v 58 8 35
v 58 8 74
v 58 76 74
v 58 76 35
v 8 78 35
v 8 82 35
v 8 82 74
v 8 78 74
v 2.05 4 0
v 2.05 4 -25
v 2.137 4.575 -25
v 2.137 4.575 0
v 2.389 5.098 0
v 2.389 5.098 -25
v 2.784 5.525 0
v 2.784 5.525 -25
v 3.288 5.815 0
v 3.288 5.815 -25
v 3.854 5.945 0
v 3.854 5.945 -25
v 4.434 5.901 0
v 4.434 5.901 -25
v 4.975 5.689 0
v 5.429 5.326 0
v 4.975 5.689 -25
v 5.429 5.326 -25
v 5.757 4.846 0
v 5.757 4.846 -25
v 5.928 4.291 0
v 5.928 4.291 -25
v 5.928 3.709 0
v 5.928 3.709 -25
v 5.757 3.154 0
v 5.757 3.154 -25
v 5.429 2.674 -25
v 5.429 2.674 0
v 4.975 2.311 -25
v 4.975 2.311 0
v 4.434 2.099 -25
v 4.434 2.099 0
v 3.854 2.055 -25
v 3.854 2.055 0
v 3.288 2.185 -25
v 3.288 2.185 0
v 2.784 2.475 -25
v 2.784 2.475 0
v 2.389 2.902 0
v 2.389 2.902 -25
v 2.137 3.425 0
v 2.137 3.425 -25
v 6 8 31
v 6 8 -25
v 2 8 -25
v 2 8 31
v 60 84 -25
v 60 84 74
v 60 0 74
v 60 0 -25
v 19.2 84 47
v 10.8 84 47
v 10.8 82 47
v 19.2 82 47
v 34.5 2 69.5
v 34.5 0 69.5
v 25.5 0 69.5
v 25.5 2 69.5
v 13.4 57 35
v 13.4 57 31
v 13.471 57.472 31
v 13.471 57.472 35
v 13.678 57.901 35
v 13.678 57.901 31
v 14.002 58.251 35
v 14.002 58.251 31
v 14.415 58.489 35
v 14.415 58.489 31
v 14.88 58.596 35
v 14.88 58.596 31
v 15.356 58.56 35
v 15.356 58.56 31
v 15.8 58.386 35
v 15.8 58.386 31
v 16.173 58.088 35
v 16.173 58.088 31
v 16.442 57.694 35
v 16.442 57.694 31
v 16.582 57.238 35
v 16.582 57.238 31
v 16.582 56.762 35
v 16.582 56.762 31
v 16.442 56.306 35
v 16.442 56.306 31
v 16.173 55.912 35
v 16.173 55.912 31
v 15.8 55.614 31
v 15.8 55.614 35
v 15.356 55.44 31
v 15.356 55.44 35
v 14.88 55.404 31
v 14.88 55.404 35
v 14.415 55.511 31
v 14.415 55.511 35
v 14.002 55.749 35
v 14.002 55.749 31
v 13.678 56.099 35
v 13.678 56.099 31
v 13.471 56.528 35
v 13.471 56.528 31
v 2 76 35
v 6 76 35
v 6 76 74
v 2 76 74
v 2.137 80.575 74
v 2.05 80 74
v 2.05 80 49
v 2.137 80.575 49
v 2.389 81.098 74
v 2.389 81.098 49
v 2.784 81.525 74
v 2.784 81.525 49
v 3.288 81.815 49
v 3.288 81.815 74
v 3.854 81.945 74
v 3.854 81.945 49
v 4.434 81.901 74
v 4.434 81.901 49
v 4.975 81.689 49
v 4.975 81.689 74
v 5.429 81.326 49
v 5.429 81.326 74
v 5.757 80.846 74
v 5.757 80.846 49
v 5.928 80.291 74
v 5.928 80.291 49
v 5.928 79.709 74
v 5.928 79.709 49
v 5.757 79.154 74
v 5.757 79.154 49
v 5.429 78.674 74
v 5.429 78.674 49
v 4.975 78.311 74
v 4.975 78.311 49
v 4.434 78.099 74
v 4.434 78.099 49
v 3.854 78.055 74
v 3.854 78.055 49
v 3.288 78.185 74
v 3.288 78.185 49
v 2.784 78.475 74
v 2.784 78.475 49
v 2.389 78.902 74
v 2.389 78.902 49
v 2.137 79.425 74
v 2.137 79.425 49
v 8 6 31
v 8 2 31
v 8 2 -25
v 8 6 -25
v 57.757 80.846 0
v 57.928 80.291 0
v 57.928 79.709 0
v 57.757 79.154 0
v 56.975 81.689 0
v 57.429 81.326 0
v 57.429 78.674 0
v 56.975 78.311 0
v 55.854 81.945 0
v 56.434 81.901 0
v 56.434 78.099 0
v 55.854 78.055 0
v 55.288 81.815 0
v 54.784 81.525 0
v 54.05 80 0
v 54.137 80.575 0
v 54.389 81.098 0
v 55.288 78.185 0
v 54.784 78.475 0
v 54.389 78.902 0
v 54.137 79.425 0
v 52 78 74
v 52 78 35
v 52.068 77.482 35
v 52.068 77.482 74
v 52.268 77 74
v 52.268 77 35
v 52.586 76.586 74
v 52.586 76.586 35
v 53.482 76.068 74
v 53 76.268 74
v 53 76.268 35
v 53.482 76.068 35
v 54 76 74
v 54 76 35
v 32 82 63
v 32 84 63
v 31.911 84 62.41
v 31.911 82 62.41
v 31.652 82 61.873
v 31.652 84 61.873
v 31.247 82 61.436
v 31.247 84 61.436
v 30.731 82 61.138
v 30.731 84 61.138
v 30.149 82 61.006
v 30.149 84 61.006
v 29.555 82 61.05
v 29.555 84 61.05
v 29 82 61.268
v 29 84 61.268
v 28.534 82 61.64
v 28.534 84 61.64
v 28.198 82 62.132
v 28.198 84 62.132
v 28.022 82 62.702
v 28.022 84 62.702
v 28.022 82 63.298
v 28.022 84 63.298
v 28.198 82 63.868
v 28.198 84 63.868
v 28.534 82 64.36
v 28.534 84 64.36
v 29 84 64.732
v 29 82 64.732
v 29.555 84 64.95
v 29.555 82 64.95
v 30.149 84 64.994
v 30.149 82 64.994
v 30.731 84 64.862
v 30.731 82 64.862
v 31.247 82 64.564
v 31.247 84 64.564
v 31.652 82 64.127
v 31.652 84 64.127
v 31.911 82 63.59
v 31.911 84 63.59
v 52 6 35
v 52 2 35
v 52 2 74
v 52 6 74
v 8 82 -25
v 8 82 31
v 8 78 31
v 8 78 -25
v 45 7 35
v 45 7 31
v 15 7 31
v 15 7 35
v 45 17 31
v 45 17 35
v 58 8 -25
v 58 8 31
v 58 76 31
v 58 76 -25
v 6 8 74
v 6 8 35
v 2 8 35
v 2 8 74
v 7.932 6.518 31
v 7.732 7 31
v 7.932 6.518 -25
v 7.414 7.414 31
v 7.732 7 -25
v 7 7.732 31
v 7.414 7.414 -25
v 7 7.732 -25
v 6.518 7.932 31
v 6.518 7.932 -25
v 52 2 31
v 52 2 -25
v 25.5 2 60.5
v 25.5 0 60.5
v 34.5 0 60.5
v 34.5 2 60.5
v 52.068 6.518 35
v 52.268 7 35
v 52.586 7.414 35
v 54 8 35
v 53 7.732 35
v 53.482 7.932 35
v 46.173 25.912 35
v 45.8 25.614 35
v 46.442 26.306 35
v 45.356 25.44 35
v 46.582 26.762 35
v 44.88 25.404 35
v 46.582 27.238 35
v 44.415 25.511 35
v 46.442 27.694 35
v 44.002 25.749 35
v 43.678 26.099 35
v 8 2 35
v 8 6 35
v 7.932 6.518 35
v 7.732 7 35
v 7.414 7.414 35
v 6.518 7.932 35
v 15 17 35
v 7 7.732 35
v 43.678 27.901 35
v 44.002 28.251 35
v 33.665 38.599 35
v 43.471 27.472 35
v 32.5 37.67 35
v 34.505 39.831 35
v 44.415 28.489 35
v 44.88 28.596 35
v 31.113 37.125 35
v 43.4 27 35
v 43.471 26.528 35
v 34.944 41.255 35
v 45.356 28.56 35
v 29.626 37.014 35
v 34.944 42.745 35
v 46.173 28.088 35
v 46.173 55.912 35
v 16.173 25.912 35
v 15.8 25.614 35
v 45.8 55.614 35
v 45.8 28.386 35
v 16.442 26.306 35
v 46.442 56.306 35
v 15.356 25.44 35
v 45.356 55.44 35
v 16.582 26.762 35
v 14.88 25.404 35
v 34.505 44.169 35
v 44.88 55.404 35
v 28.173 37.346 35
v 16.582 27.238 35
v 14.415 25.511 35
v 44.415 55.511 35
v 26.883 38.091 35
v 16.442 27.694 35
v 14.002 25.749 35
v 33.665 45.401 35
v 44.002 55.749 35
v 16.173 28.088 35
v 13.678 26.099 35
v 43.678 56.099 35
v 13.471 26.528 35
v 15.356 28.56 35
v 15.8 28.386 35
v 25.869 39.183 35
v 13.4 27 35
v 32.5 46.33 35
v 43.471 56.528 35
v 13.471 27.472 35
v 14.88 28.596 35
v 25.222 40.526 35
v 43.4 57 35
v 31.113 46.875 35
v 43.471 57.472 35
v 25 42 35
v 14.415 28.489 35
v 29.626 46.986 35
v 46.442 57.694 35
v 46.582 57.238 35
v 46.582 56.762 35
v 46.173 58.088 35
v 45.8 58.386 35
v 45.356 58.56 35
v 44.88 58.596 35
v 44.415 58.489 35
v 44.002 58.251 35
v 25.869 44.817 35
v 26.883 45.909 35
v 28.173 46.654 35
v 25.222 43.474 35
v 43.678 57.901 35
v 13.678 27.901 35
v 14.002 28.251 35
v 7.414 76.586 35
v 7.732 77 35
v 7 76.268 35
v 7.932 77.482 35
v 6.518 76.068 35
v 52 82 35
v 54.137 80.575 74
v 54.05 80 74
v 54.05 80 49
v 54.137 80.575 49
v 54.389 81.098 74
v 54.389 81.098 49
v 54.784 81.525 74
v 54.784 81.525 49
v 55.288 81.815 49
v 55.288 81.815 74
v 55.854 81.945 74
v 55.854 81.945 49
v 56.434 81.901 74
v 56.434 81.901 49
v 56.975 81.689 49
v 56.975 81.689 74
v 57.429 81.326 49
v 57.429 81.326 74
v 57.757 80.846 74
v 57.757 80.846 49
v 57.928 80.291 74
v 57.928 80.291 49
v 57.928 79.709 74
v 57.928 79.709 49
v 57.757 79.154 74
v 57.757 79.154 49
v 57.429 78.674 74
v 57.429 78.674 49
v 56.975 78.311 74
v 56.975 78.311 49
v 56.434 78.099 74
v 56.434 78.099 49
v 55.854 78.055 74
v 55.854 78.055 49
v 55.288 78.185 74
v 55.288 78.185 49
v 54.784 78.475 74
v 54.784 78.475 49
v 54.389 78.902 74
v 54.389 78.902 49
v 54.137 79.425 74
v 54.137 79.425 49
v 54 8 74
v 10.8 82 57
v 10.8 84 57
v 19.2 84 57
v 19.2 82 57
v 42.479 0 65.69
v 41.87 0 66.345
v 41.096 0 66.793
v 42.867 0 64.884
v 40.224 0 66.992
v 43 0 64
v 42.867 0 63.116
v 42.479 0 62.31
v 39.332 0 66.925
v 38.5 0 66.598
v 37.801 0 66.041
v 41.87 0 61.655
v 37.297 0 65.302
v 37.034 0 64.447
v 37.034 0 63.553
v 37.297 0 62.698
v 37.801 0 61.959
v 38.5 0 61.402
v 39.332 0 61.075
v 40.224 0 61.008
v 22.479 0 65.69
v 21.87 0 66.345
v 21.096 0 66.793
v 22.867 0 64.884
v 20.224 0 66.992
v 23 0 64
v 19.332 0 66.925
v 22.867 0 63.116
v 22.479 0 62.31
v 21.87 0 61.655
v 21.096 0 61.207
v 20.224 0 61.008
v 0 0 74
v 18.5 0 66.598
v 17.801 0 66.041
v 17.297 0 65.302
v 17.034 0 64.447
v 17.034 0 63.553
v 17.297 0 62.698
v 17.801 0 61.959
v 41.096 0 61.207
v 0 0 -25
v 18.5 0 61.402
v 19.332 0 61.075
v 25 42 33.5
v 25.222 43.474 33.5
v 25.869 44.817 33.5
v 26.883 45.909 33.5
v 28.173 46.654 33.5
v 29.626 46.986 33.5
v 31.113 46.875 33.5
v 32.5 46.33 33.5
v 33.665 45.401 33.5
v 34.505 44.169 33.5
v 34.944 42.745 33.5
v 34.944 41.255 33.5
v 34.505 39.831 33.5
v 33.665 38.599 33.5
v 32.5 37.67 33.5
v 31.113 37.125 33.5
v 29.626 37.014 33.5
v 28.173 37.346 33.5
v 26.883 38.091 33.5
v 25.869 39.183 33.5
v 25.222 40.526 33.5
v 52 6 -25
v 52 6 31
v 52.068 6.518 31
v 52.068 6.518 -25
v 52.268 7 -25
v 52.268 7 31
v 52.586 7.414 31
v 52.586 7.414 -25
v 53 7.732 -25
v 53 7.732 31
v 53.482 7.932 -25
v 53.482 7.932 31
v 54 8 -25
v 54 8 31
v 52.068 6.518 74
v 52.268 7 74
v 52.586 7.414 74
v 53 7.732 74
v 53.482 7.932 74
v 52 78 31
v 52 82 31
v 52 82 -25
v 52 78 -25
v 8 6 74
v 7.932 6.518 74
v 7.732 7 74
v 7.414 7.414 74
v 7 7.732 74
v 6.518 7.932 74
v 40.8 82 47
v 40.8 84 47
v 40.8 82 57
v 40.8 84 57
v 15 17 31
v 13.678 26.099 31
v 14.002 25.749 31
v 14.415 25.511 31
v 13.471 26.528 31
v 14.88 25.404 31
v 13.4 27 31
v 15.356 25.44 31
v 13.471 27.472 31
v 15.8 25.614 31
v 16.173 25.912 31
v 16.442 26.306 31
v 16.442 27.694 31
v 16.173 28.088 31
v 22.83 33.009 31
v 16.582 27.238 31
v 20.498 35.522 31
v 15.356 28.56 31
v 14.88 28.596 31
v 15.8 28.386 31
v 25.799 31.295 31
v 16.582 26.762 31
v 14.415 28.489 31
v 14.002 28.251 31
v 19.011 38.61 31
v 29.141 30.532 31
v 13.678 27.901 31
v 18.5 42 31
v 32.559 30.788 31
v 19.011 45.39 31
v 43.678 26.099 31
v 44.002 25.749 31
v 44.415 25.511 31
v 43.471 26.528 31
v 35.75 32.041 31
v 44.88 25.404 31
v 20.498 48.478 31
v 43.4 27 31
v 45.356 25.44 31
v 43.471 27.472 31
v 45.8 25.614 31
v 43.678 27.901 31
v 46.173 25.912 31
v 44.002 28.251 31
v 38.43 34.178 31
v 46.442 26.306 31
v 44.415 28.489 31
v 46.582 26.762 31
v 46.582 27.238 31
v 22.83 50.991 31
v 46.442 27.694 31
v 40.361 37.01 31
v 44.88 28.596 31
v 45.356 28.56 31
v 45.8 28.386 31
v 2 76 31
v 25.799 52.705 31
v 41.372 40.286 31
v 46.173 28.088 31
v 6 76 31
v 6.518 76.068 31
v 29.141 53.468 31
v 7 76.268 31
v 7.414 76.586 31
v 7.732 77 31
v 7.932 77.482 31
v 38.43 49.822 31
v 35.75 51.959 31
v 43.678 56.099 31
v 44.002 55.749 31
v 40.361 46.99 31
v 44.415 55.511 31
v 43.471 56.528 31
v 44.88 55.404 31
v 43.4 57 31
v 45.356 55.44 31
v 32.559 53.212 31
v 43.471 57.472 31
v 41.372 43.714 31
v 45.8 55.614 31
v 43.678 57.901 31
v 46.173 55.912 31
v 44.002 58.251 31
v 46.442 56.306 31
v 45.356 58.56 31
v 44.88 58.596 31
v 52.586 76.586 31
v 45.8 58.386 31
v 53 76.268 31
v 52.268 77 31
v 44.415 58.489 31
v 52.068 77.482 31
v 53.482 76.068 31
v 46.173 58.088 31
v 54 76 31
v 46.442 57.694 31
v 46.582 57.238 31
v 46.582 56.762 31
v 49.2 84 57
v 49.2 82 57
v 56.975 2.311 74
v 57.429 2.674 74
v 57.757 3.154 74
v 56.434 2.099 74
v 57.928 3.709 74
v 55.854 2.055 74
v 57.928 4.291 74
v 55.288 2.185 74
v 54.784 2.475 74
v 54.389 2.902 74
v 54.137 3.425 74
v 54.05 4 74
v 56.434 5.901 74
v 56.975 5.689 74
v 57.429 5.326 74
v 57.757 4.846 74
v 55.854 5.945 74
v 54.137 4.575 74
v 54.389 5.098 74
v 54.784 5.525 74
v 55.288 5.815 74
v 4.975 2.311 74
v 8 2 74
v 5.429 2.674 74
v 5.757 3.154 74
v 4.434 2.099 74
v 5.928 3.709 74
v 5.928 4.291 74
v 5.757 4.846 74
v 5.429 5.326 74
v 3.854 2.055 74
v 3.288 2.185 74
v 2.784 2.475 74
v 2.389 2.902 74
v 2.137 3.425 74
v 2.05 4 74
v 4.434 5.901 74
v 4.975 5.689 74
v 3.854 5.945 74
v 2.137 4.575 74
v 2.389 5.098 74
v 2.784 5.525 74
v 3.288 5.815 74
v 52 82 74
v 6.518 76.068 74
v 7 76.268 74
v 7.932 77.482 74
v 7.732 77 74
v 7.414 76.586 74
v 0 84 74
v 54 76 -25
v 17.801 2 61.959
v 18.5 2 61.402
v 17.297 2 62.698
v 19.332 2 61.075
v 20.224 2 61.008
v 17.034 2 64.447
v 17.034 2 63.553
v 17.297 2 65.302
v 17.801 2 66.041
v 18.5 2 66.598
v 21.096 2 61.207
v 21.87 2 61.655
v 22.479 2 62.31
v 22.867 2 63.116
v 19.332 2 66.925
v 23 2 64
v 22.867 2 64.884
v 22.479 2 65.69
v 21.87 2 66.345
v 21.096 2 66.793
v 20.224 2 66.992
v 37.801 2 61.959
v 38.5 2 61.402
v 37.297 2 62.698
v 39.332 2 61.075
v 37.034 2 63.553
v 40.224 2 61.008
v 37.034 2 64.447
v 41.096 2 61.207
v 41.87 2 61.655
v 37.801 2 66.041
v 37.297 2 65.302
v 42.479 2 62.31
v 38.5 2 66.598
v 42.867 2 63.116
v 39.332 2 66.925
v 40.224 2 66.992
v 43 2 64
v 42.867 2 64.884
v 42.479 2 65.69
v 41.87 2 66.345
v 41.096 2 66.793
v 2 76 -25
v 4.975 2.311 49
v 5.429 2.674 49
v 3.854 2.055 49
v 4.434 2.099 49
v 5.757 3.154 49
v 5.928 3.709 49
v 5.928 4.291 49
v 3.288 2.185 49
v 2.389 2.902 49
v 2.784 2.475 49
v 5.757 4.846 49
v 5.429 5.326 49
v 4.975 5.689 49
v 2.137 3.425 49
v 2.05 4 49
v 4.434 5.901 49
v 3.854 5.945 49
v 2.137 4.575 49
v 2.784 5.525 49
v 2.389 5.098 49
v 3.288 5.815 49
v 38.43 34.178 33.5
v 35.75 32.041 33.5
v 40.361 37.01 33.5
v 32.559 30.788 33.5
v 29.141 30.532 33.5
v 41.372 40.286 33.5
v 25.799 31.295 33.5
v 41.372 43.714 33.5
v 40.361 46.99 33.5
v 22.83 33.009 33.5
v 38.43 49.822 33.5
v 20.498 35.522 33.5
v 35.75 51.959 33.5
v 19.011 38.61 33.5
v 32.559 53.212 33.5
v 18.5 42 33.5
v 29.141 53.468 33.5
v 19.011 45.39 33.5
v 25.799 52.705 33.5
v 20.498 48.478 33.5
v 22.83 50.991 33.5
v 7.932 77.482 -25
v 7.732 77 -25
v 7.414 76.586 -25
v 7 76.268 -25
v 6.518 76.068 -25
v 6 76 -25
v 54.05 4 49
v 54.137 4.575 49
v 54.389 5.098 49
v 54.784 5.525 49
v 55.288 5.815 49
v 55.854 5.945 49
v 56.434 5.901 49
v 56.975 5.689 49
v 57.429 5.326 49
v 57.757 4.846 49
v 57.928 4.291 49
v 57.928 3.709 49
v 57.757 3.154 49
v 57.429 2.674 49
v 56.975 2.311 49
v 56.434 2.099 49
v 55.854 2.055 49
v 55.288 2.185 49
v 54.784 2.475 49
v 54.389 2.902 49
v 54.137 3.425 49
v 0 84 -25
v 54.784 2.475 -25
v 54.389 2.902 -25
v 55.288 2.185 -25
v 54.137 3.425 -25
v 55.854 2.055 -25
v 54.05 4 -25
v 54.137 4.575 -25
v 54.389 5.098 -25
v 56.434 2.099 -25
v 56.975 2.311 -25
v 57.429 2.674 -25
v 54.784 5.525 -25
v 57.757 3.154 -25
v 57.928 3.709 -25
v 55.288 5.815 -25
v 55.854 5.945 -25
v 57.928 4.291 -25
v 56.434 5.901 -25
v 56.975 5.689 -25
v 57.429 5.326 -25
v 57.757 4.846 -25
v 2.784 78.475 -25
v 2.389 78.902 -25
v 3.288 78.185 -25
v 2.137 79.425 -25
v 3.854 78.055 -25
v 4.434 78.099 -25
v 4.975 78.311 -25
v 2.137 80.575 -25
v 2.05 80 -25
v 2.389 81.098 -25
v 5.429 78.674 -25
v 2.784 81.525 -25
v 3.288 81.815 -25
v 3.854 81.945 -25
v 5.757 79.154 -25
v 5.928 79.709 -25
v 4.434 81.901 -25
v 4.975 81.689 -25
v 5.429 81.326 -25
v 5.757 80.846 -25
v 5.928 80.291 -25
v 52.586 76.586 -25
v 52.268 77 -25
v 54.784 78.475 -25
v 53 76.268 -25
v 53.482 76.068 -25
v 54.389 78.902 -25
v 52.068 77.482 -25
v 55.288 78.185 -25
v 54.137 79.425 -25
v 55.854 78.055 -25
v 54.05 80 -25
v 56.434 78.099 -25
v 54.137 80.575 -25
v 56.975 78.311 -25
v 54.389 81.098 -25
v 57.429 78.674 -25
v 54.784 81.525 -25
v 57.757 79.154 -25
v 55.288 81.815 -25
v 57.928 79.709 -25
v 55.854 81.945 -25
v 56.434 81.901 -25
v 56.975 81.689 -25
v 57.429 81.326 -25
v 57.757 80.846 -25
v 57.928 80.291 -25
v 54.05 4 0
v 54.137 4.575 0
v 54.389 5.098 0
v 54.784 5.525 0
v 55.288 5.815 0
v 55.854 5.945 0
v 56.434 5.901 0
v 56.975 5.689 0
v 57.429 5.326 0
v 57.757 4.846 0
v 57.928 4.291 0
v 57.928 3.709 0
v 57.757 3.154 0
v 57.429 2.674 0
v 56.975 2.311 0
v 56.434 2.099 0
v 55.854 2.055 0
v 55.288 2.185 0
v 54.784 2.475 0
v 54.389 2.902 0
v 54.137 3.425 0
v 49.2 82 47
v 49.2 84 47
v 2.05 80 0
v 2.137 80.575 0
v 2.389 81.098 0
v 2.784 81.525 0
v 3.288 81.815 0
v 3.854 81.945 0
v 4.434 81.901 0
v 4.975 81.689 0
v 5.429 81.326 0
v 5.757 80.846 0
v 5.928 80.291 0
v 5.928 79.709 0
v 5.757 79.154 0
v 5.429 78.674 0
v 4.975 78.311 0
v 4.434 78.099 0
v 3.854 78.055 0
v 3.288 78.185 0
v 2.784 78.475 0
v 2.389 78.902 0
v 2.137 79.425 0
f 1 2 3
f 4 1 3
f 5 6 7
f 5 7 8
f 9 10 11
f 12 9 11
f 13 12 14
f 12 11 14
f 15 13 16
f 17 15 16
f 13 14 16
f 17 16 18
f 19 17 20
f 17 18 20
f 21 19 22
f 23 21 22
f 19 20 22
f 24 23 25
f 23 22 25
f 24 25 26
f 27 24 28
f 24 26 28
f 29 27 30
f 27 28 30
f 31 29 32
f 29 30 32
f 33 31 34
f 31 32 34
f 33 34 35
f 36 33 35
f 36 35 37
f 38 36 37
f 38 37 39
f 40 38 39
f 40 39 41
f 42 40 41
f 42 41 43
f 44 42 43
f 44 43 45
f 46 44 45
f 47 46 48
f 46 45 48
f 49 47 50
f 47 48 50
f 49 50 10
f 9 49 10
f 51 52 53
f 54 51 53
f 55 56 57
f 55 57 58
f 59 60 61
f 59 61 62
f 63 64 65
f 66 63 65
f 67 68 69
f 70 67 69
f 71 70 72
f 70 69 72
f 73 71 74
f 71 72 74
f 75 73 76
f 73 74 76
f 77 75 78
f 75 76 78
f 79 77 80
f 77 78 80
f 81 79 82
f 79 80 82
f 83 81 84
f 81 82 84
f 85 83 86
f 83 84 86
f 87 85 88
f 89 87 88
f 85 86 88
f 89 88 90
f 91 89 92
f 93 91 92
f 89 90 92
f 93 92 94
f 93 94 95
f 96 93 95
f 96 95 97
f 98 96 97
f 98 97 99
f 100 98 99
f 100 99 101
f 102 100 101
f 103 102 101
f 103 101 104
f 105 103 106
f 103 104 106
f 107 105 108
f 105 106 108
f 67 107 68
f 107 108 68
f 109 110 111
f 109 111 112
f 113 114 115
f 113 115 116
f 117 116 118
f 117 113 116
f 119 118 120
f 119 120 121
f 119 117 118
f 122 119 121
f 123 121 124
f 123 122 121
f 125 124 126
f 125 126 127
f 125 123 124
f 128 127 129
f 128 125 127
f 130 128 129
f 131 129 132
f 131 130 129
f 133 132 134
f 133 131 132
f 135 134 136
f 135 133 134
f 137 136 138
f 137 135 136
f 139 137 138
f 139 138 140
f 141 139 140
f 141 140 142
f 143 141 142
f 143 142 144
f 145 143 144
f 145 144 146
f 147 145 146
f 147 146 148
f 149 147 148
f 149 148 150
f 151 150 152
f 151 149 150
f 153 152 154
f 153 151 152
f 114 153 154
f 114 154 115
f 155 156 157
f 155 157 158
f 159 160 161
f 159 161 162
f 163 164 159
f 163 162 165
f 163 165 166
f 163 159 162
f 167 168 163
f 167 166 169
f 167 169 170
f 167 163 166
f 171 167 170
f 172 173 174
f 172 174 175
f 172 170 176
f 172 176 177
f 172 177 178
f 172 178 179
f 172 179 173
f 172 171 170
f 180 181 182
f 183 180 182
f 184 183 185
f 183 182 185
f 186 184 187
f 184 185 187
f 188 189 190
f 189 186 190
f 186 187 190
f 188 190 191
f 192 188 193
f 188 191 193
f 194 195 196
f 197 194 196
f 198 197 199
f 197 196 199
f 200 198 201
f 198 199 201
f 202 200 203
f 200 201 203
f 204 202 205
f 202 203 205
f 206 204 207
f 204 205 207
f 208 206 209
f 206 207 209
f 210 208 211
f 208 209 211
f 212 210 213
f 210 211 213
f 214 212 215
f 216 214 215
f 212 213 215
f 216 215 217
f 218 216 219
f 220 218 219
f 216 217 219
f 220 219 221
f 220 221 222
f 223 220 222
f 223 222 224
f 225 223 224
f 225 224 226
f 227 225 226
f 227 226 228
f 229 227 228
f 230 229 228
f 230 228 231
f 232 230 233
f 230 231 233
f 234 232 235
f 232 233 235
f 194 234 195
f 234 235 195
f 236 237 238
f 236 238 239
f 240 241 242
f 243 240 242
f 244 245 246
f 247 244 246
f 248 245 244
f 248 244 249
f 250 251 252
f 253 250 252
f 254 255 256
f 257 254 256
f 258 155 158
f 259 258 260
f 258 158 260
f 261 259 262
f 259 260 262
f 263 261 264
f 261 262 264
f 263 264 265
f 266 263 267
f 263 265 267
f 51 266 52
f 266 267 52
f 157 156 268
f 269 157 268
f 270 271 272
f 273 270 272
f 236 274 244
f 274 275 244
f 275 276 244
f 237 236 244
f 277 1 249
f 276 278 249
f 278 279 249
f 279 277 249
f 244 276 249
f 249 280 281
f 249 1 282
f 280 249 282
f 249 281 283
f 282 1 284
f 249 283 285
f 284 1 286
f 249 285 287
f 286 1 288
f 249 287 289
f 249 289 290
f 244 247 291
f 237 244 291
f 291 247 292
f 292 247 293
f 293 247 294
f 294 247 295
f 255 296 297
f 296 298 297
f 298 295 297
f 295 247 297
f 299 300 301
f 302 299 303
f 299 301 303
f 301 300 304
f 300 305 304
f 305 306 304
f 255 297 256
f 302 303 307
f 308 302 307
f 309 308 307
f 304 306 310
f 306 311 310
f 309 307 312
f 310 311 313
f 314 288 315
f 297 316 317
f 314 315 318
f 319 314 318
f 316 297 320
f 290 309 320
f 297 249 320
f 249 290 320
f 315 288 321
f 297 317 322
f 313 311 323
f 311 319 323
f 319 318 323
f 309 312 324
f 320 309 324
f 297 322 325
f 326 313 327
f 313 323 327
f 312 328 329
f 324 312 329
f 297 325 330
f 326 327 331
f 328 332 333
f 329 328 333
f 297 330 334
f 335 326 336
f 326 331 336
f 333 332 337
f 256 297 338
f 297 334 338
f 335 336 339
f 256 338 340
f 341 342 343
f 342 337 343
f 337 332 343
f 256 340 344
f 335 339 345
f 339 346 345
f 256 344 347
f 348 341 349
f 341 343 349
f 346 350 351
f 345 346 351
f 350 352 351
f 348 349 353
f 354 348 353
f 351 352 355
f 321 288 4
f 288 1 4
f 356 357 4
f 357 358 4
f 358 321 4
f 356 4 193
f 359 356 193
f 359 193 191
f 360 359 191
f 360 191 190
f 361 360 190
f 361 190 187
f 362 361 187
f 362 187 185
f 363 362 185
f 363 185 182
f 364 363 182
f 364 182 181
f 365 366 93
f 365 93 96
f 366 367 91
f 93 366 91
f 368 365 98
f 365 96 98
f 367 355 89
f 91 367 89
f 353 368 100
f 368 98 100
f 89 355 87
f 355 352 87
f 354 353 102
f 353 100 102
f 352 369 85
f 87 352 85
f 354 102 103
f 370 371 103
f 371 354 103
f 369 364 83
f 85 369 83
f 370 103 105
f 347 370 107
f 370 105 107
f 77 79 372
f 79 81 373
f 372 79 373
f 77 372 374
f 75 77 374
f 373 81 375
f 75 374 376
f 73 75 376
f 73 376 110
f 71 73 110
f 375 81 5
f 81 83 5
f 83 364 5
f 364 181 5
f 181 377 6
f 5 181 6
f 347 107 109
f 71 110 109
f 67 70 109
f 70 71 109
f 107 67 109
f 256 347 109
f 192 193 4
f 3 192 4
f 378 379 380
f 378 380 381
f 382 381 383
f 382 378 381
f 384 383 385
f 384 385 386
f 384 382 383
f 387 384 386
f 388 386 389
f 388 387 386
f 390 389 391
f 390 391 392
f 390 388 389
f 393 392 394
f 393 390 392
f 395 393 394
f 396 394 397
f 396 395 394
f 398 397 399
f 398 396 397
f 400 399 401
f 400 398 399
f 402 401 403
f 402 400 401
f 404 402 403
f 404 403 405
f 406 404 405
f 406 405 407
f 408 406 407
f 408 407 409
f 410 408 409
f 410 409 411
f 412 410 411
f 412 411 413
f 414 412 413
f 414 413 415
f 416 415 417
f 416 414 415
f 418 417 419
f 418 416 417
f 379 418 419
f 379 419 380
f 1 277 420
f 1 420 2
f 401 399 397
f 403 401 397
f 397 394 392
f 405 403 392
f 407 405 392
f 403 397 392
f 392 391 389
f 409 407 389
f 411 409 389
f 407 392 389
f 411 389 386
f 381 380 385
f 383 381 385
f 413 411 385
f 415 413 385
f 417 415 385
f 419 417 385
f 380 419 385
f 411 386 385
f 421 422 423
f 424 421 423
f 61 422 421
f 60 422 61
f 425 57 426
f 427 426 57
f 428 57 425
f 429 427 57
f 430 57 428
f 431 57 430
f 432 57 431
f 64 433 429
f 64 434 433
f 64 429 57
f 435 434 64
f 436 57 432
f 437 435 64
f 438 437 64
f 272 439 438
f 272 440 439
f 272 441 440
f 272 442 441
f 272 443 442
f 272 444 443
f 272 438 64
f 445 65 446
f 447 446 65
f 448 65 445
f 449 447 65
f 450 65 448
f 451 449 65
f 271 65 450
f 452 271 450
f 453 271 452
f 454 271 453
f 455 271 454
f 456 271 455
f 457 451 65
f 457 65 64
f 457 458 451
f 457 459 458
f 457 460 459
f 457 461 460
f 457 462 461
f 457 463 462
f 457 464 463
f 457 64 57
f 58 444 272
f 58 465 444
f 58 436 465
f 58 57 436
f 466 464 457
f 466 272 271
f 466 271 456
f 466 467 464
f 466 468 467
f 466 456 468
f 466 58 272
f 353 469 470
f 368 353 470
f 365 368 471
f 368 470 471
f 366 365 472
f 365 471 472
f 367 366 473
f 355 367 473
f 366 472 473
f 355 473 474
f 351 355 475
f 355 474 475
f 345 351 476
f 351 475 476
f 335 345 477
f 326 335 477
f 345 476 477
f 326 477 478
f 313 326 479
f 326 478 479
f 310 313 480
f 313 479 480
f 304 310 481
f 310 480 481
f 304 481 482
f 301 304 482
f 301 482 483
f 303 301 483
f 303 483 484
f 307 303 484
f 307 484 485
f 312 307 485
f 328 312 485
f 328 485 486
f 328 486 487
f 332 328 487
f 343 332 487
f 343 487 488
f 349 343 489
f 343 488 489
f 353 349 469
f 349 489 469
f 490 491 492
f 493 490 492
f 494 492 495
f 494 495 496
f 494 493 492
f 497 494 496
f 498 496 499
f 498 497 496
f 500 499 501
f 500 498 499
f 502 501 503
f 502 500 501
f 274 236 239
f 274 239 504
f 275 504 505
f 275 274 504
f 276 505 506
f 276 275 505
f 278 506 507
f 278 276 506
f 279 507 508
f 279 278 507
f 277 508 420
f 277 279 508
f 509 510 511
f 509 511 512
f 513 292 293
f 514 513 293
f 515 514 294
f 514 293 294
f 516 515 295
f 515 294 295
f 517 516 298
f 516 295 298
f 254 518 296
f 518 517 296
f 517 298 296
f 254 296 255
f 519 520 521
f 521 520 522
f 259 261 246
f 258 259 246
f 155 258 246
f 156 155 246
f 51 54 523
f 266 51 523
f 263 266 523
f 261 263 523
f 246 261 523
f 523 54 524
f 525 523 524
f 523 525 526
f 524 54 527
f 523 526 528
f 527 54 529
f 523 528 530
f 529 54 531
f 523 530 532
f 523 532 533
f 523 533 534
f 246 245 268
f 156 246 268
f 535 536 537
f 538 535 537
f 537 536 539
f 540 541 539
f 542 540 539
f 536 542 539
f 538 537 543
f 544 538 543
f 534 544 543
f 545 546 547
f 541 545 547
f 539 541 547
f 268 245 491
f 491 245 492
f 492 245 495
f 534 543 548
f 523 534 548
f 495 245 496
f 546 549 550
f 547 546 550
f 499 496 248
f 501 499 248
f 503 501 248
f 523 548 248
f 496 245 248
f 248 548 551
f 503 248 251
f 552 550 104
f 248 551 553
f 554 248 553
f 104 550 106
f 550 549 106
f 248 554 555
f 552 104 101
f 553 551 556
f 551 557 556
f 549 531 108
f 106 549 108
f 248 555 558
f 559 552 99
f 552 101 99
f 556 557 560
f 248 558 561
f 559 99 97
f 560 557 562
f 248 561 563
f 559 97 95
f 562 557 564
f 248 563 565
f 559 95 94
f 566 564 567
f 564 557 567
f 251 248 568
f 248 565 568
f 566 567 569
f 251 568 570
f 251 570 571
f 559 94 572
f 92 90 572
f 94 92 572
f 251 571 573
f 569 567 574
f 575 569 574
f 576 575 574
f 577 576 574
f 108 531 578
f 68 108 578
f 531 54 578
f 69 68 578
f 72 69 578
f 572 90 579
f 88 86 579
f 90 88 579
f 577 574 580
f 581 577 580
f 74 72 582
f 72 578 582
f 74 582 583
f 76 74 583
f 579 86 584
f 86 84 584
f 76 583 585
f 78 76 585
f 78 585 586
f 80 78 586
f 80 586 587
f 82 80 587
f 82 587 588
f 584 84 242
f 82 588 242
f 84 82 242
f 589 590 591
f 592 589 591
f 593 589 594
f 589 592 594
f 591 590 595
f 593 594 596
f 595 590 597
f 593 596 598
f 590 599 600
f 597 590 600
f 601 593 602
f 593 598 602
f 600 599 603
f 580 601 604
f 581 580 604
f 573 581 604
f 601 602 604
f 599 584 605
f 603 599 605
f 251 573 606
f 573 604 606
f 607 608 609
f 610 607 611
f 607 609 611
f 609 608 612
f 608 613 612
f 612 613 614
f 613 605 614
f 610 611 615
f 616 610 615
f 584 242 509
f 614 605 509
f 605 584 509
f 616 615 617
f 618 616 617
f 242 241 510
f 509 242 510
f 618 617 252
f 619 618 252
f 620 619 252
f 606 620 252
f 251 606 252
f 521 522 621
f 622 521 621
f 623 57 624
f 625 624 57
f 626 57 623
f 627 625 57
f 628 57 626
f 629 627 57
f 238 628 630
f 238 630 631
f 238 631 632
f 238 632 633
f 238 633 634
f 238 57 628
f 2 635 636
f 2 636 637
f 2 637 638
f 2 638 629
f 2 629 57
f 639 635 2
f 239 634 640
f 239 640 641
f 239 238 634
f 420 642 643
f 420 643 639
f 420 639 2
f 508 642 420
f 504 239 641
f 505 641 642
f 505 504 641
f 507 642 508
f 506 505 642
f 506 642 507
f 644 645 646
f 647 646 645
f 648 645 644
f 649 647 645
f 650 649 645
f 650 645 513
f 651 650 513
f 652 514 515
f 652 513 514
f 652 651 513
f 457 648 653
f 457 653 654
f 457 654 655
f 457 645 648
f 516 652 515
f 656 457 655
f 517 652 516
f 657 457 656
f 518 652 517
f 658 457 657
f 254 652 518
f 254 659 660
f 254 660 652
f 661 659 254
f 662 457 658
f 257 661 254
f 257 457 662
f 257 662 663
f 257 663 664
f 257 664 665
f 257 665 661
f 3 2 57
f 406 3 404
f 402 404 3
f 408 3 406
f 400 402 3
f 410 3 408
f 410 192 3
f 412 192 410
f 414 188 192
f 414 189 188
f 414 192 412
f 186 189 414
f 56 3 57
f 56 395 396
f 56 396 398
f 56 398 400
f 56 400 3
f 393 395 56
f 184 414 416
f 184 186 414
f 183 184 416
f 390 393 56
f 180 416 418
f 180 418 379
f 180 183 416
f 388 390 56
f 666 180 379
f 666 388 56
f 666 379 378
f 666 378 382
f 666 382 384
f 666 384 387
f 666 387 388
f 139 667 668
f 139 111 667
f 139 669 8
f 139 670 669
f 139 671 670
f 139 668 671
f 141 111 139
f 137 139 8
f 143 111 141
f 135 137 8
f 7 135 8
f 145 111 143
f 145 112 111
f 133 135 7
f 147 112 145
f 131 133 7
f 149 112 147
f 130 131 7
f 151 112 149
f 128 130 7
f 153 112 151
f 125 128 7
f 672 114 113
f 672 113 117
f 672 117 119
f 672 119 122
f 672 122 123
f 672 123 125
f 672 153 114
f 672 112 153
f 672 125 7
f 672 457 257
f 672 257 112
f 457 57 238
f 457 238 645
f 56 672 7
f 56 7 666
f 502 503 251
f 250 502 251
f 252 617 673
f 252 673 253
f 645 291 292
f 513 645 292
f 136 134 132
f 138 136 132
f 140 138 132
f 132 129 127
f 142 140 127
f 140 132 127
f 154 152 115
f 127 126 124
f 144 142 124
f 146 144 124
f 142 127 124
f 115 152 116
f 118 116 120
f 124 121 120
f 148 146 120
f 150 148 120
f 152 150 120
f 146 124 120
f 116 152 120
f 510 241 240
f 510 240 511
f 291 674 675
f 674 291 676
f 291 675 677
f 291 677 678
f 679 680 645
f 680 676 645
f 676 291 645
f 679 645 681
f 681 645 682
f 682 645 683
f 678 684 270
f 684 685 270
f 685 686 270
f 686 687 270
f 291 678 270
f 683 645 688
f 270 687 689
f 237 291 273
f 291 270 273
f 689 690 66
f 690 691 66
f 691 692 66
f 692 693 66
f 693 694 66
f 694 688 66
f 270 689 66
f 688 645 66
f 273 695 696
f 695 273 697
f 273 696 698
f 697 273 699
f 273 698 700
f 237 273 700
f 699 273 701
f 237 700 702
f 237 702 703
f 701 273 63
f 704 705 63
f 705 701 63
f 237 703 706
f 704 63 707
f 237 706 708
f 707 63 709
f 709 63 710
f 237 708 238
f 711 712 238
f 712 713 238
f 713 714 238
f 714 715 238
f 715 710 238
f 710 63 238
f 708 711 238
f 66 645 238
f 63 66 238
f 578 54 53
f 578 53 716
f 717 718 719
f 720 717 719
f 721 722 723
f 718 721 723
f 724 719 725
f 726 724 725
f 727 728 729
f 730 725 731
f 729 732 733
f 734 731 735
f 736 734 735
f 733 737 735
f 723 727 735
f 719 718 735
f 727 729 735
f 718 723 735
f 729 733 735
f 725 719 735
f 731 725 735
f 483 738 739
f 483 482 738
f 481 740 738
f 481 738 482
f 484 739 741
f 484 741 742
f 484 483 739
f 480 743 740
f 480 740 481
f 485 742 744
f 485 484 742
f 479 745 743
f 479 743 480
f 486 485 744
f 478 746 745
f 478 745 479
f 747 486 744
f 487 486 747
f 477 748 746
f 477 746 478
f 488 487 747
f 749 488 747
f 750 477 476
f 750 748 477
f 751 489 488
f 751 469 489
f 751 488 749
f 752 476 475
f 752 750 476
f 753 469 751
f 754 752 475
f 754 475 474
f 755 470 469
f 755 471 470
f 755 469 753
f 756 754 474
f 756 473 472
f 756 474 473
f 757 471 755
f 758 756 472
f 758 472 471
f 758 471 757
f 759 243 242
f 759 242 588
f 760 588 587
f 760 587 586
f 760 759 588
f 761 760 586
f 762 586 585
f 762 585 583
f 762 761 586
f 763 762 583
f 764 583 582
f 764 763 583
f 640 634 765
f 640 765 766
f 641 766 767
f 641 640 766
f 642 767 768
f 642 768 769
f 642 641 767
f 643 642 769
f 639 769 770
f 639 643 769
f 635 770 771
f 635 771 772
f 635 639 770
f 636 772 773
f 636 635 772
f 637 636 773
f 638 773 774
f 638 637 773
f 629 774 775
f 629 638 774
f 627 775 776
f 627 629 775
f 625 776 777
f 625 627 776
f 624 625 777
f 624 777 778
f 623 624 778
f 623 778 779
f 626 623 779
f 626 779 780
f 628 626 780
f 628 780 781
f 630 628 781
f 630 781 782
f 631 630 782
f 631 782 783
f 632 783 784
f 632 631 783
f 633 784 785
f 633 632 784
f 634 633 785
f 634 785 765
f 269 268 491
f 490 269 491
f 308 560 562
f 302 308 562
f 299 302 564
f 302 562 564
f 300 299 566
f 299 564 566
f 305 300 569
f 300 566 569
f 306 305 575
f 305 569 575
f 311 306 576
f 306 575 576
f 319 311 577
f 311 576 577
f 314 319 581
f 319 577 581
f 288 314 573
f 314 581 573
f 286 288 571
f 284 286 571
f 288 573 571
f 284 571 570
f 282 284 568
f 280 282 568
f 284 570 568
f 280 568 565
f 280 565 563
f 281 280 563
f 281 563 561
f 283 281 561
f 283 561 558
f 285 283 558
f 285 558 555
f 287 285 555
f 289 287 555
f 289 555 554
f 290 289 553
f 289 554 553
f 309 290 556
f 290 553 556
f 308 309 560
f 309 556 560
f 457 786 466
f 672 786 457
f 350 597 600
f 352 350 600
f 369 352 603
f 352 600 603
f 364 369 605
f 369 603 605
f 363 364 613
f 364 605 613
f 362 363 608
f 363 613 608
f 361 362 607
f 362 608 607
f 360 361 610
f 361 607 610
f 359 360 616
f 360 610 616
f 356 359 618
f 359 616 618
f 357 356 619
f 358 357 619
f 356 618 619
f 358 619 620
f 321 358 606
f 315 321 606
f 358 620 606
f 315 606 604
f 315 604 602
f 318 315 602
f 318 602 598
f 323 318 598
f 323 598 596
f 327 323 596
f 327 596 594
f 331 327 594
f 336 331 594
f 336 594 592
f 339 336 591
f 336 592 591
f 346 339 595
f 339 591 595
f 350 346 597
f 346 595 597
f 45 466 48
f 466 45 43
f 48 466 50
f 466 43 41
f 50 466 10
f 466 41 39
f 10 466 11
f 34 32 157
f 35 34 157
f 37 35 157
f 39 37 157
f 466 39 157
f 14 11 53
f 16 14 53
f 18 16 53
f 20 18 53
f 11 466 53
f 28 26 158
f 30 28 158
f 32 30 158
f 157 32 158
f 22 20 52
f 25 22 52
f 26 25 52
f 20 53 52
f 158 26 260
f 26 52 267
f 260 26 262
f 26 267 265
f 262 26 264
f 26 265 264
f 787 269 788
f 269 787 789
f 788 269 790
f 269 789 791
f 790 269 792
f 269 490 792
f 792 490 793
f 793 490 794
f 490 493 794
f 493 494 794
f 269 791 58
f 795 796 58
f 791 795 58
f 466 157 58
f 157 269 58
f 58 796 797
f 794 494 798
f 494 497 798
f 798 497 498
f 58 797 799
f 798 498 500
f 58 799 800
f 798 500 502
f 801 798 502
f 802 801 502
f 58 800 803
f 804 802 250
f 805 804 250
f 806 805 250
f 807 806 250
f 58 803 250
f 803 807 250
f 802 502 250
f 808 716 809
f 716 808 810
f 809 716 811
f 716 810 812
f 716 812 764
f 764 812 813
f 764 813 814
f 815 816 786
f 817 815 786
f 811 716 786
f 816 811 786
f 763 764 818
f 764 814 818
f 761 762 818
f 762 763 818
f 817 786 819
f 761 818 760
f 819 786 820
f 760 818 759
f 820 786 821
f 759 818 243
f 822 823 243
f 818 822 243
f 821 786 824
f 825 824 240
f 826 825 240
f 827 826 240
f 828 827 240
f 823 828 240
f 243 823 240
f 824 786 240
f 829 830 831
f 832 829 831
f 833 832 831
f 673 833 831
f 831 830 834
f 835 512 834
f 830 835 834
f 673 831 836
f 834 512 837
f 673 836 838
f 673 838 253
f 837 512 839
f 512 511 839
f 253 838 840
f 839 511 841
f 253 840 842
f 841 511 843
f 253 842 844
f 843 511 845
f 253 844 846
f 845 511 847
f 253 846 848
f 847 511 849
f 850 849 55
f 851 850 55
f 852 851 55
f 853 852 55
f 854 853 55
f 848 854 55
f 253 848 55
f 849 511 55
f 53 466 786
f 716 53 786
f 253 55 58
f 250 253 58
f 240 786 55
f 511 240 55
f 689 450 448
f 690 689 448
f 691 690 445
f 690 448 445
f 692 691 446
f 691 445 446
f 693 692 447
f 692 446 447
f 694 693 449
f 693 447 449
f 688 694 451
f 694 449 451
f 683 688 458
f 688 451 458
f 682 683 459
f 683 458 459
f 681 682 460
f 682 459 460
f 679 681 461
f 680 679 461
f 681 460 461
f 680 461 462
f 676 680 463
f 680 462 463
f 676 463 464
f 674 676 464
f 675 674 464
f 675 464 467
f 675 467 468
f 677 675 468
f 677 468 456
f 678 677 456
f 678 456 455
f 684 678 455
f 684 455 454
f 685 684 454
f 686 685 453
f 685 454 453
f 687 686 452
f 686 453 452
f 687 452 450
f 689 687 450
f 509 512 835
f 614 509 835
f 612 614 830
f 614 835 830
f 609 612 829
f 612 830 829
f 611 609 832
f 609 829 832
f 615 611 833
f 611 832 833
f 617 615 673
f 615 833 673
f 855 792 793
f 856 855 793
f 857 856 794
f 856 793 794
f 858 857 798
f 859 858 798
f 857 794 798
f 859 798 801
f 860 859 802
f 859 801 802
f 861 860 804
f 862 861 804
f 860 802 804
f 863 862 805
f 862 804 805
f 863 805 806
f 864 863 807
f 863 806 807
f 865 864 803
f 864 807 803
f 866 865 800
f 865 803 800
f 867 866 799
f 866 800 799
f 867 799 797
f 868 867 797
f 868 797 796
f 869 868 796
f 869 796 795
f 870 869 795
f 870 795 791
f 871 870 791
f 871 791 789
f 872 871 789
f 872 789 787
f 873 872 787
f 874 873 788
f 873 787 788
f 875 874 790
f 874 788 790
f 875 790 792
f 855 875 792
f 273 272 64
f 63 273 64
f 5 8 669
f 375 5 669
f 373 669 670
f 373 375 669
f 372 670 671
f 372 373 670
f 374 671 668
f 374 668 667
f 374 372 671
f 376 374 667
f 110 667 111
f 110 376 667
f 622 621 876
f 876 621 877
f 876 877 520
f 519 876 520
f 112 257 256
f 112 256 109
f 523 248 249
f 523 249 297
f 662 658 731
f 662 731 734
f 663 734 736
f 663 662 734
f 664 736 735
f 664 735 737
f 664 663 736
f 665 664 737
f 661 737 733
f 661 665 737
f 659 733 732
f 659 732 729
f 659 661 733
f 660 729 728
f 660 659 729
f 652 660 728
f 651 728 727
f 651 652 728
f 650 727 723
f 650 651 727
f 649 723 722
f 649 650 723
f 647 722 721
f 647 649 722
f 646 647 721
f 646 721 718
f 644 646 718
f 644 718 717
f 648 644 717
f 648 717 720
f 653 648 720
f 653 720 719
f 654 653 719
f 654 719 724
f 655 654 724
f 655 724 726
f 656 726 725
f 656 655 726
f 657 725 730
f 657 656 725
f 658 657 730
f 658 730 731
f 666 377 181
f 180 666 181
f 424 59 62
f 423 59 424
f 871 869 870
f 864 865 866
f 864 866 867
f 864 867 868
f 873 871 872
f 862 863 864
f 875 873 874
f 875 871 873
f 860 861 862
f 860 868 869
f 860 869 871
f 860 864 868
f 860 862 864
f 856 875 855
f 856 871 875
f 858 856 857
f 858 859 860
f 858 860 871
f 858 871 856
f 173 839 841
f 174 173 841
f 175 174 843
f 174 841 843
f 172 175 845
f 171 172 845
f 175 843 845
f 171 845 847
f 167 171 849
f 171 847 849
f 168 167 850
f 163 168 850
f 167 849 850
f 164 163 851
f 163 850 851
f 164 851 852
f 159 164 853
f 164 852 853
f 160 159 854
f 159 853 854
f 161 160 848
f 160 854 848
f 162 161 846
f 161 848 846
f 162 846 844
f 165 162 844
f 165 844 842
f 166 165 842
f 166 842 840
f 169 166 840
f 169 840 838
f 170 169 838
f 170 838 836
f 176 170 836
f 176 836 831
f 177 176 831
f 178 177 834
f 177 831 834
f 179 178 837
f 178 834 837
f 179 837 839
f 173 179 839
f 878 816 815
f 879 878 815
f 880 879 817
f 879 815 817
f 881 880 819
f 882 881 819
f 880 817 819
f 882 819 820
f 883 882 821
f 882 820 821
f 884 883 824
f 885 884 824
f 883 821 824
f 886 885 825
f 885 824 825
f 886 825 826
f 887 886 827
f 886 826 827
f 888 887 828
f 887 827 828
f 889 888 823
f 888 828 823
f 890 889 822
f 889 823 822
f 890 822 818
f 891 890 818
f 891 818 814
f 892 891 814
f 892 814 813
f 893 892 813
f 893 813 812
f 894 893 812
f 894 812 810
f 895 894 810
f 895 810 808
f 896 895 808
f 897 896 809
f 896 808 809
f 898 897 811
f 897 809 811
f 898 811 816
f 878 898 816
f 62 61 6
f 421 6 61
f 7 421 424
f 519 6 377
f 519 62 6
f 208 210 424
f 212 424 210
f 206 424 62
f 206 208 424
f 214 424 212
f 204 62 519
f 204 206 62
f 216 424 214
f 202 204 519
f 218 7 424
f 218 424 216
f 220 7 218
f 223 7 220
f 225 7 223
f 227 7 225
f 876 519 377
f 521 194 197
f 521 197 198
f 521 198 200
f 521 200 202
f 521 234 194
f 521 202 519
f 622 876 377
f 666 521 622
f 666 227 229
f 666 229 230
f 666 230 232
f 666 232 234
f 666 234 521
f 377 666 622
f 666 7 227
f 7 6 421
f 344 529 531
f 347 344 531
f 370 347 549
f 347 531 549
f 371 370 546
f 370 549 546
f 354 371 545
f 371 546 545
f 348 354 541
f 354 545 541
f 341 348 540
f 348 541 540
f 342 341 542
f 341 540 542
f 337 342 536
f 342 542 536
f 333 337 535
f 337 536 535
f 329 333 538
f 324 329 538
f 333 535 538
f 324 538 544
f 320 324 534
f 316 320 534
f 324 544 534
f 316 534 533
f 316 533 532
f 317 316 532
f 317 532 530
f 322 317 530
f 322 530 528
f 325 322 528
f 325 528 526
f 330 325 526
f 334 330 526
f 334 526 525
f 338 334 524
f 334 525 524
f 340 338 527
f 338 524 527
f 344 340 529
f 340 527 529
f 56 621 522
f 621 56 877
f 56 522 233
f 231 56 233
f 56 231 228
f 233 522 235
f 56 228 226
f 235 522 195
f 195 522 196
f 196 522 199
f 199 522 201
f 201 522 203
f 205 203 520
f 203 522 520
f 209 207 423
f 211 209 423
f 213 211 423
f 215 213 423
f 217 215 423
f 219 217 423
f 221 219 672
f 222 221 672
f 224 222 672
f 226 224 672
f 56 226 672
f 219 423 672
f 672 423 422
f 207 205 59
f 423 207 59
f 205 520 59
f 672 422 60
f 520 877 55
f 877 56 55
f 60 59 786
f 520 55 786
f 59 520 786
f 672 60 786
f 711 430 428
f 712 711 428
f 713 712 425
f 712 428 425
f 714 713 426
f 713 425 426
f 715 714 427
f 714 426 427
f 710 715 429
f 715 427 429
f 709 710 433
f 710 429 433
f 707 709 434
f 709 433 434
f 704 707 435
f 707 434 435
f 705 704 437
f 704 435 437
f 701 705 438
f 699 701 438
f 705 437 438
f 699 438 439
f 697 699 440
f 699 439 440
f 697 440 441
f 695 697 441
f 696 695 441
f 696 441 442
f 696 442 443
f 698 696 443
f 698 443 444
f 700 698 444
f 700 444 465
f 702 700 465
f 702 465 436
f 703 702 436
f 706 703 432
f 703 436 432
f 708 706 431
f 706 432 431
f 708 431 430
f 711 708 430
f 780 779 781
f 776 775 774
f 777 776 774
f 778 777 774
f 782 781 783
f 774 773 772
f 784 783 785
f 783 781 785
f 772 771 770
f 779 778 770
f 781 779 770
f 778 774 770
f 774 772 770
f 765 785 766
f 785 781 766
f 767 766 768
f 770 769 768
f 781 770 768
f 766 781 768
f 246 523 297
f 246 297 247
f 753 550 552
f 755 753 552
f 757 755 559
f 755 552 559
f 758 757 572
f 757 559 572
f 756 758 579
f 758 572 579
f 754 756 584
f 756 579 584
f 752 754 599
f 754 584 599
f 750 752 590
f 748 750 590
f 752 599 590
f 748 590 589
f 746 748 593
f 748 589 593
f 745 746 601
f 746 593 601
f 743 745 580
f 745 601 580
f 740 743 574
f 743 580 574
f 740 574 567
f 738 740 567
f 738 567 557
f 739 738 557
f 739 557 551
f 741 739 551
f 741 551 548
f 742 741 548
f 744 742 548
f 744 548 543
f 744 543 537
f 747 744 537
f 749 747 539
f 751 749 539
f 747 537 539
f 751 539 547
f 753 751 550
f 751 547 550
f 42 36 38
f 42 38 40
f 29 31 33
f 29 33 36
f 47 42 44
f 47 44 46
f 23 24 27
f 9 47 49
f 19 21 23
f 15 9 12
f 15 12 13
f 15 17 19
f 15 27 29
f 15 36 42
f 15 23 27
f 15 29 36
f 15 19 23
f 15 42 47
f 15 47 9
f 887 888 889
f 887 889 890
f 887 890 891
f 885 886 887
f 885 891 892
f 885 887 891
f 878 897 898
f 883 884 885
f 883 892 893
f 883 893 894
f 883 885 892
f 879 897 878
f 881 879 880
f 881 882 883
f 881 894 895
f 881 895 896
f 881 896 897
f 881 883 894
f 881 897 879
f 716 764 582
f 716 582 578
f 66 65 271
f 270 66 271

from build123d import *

# Parameters (mm, degrees)
SKETCH1_W                = 60
SKETCH1_H                = 84
BOSS_EXTRUDE2_DEPTH      = 82
BOSS_EXTRUDE2_DEPTH_BACK = 25
SKETCH2_W                = 56
SKETCH2_H                = 80
CUT_EXTRUDE1_DEPTH       = 108
BOSS_EXTRUDE6_DEPTH      = 107
SKETCH22_R               = 1.95
CUT_EXTRUDE6_DEPTH       = 25
CUT_EXTRUDE9_DEPTH       = 2
SKETCH28_W               = 8
SKETCH28_H               = 85.946450773
CUT_EXTRUDE11_DEPTH      = 60
BOSS_EXTRUDE9_DEPTH      = 84
SKETCH37_R               = 1.6
CUT_EXTRUDE15_DEPTH      = 4
CUT_EXTRUDE16_DEPTH      = 4
SKETCH41_R               = 2
CUT_EXTRUDE17_DEPTH      = 2
SKETCH42_R               = 11.5
CUT_EXTRUDE18_DEPTH      = 2.5
SKETCH43_R               = 5
CUT_EXTRUDE19_DEPTH      = 1.5
SKETCH44_R               = 3
CUT_EXTRUDE20_DEPTH      = 2


with BuildPart() as part:
    # Sketch1 → Boss-Extrude2 (new body, two sides)
    with BuildSketch(Plane.XY) as boss_extrude2_sk:
        with Locations((30, 42)):
            Rectangle(SKETCH1_W, SKETCH1_H)
    extrude(amount=BOSS_EXTRUDE2_DEPTH)
    extrude(boss_extrude2_sk.sketch, amount=-BOSS_EXTRUDE2_DEPTH_BACK)

    # Sketch2 → Cut-Extrude1 (cut, through all)
    with BuildSketch(Plane.XY.offset(82)):
        with Locations((30, 42)):
            Rectangle(SKETCH2_W, SKETCH2_H)
    extrude(amount=-CUT_EXTRUDE1_DEPTH, mode=Mode.SUBTRACT)

    # Sketch8 → Boss-Extrude6 (add)
    with BuildSketch(Plane(origin=(0, 0, -25), x_dir=(-1, 0, 0), z_dir=(0, 0, -1))):
        with BuildLine():
            Line((-58, 82), (-52, 82))
            Line((-52, 82), (-52, 78))
            ThreePointArc((-52, 78), (-52.585786438, 76.585786438), (-54, 76))
            Line((-54, 76), (-58, 76))
            Line((-58, 76), (-58, 82))
        make_face()
        with BuildLine():
            Line((-2, 2), (-8, 2))
            Line((-8, 2), (-8, 6))
            ThreePointArc((-8, 6), (-7.414213562, 7.414213562), (-6, 8))
            Line((-6, 8), (-2, 8))
            Line((-2, 8), (-2, 2))
        make_face()
        with BuildLine():
            Line((-2, 76), (-2, 82))
            Line((-2, 82), (-8, 82))
            Line((-8, 82), (-8, 78))
            ThreePointArc((-8, 78), (-7.414213562, 76.585786438), (-6, 76))
            Line((-6, 76), (-2, 76))
        make_face()
        with BuildLine():
            Line((-58, 8), (-58, 2))
            Line((-58, 2), (-52, 2))
            Line((-52, 2), (-52, 6))
            ThreePointArc((-52, 6), (-52.585786438, 7.414213562), (-54, 8))
            Line((-54, 8), (-58, 8))
        make_face()
    extrude(amount=-BOSS_EXTRUDE6_DEPTH)

    # Sketch22 → Cut-Extrude6 (cut)
    with BuildSketch(Plane(origin=(0, 0, -25), x_dir=(-1, 0, 0), z_dir=(0, 0, -1))):
        with Locations((-56, 80)):
            Circle(SKETCH22_R)
        with Locations((-4, 80)):
            Circle(SKETCH22_R)
        with Locations((-4, 4)):
            Circle(SKETCH22_R)
        with Locations((-56, 4)):
            Circle(SKETCH22_R)
    cut_extrude6 = extrude(amount=-CUT_EXTRUDE6_DEPTH, mode=Mode.SUBTRACT)

    # Sketch26 → Cut-Extrude9 (cut)
    with BuildSketch(Plane(origin=(0, 84, 0), x_dir=(1, 0, 0), z_dir=(0, 1, 0))):
        Polygon((15, -57), (10.8, -57), (10.8, -47), (19.2, -47), (19.2, -57), align=None)
        Polygon((40.8, -47), (40.8, -57), (45, -57), (49.2, -57), (49.2, -47), align=None)
    extrude(amount=-CUT_EXTRUDE9_DEPTH, mode=Mode.SUBTRACT)

    # Sketch28 → Cut-Extrude11 (cut)
    with BuildSketch(Plane.ZY):
        with Locations((78, 41.026774614)):
            Rectangle(SKETCH28_W, SKETCH28_H)
    extrude(amount=-CUT_EXTRUDE11_DEPTH, mode=Mode.SUBTRACT)

    # Sketch32 → Boss-Extrude9 (add)
    with BuildSketch(Plane(origin=(0, 84, 0), x_dir=(1, 0, 0), z_dir=(0, 1, 0))):
        Polygon((60, -33), (60, -35), (0, -35), (0, -33), (0, -31), (60, -31), align=None)
    extrude(amount=-BOSS_EXTRUDE9_DEPTH)

    # Sketch37 → Cut-Extrude15 (cut)
    with BuildSketch(Plane(origin=(0, 0, 31), x_dir=(-1, 0, 0), z_dir=(0, 0, -1))):
        with Locations((-15, 57)):
            Circle(SKETCH37_R)
        with Locations((-45, 57)):
            Circle(SKETCH37_R)
        with Locations((-45, 27)):
            Circle(SKETCH37_R)
        with Locations((-15, 27)):
            Circle(SKETCH37_R)
    extrude(amount=-CUT_EXTRUDE15_DEPTH, mode=Mode.SUBTRACT)

    # Sketch38 → Cut-Extrude16 (cut)
    with BuildSketch(Plane(origin=(0, 0, 31), x_dir=(-1, 0, 0), z_dir=(0, 0, -1))):
        Polygon((-30, 7), (-45, 7), (-45, 17), (-15, 17), (-15, 7), align=None)
    extrude(amount=-CUT_EXTRUDE16_DEPTH, mode=Mode.SUBTRACT)

    # Mirror1: Cut-Extrude6 across plane
    add(cut_extrude6.mirror(Plane(origin=(0, 0, 24.5), x_dir=(1, 0, 0), z_dir=(0, 0, -1))), mode=Mode.SUBTRACT)

    # Sketch41 → Cut-Extrude17 (cut)
    with BuildSketch(Plane(origin=(0, 84, 0), x_dir=(1, 0, 0), z_dir=(0, 1, 0))):
        with Locations((30, -63)):
            Circle(SKETCH41_R)
    extrude(amount=-CUT_EXTRUDE17_DEPTH, mode=Mode.SUBTRACT)

    # Sketch42 → Cut-Extrude18 (cut)
    with BuildSketch(Plane(origin=(0, 0, 31), x_dir=(-1, 0, 0), z_dir=(0, 0, -1))):
        with Locations((-30, 42)):
            Circle(SKETCH42_R)
    extrude(amount=-CUT_EXTRUDE18_DEPTH, mode=Mode.SUBTRACT)

    # Sketch43 → Cut-Extrude19 (cut)
    with BuildSketch(Plane(origin=(0, 0, 33.5), x_dir=(-1, 0, 0), z_dir=(0, 0, -1))):
        with Locations((-30, 42)):
            Circle(SKETCH43_R)
    extrude(amount=-CUT_EXTRUDE19_DEPTH, mode=Mode.SUBTRACT)

    # Sketch44 → Cut-Extrude20 (cut)
    with BuildSketch(Plane.XZ):
        with Locations((20, 64)):
            Circle(SKETCH44_R)
        with Locations((40, 64)):
            Circle(SKETCH44_R)
        Polygon((30, 69.5), (25.5, 69.5), (25.5, 60.5), (34.5, 60.5), (34.5, 69.5), align=None)
    extrude(amount=-CUT_EXTRUDE20_DEPTH, mode=Mode.SUBTRACT)


solid = part.part
